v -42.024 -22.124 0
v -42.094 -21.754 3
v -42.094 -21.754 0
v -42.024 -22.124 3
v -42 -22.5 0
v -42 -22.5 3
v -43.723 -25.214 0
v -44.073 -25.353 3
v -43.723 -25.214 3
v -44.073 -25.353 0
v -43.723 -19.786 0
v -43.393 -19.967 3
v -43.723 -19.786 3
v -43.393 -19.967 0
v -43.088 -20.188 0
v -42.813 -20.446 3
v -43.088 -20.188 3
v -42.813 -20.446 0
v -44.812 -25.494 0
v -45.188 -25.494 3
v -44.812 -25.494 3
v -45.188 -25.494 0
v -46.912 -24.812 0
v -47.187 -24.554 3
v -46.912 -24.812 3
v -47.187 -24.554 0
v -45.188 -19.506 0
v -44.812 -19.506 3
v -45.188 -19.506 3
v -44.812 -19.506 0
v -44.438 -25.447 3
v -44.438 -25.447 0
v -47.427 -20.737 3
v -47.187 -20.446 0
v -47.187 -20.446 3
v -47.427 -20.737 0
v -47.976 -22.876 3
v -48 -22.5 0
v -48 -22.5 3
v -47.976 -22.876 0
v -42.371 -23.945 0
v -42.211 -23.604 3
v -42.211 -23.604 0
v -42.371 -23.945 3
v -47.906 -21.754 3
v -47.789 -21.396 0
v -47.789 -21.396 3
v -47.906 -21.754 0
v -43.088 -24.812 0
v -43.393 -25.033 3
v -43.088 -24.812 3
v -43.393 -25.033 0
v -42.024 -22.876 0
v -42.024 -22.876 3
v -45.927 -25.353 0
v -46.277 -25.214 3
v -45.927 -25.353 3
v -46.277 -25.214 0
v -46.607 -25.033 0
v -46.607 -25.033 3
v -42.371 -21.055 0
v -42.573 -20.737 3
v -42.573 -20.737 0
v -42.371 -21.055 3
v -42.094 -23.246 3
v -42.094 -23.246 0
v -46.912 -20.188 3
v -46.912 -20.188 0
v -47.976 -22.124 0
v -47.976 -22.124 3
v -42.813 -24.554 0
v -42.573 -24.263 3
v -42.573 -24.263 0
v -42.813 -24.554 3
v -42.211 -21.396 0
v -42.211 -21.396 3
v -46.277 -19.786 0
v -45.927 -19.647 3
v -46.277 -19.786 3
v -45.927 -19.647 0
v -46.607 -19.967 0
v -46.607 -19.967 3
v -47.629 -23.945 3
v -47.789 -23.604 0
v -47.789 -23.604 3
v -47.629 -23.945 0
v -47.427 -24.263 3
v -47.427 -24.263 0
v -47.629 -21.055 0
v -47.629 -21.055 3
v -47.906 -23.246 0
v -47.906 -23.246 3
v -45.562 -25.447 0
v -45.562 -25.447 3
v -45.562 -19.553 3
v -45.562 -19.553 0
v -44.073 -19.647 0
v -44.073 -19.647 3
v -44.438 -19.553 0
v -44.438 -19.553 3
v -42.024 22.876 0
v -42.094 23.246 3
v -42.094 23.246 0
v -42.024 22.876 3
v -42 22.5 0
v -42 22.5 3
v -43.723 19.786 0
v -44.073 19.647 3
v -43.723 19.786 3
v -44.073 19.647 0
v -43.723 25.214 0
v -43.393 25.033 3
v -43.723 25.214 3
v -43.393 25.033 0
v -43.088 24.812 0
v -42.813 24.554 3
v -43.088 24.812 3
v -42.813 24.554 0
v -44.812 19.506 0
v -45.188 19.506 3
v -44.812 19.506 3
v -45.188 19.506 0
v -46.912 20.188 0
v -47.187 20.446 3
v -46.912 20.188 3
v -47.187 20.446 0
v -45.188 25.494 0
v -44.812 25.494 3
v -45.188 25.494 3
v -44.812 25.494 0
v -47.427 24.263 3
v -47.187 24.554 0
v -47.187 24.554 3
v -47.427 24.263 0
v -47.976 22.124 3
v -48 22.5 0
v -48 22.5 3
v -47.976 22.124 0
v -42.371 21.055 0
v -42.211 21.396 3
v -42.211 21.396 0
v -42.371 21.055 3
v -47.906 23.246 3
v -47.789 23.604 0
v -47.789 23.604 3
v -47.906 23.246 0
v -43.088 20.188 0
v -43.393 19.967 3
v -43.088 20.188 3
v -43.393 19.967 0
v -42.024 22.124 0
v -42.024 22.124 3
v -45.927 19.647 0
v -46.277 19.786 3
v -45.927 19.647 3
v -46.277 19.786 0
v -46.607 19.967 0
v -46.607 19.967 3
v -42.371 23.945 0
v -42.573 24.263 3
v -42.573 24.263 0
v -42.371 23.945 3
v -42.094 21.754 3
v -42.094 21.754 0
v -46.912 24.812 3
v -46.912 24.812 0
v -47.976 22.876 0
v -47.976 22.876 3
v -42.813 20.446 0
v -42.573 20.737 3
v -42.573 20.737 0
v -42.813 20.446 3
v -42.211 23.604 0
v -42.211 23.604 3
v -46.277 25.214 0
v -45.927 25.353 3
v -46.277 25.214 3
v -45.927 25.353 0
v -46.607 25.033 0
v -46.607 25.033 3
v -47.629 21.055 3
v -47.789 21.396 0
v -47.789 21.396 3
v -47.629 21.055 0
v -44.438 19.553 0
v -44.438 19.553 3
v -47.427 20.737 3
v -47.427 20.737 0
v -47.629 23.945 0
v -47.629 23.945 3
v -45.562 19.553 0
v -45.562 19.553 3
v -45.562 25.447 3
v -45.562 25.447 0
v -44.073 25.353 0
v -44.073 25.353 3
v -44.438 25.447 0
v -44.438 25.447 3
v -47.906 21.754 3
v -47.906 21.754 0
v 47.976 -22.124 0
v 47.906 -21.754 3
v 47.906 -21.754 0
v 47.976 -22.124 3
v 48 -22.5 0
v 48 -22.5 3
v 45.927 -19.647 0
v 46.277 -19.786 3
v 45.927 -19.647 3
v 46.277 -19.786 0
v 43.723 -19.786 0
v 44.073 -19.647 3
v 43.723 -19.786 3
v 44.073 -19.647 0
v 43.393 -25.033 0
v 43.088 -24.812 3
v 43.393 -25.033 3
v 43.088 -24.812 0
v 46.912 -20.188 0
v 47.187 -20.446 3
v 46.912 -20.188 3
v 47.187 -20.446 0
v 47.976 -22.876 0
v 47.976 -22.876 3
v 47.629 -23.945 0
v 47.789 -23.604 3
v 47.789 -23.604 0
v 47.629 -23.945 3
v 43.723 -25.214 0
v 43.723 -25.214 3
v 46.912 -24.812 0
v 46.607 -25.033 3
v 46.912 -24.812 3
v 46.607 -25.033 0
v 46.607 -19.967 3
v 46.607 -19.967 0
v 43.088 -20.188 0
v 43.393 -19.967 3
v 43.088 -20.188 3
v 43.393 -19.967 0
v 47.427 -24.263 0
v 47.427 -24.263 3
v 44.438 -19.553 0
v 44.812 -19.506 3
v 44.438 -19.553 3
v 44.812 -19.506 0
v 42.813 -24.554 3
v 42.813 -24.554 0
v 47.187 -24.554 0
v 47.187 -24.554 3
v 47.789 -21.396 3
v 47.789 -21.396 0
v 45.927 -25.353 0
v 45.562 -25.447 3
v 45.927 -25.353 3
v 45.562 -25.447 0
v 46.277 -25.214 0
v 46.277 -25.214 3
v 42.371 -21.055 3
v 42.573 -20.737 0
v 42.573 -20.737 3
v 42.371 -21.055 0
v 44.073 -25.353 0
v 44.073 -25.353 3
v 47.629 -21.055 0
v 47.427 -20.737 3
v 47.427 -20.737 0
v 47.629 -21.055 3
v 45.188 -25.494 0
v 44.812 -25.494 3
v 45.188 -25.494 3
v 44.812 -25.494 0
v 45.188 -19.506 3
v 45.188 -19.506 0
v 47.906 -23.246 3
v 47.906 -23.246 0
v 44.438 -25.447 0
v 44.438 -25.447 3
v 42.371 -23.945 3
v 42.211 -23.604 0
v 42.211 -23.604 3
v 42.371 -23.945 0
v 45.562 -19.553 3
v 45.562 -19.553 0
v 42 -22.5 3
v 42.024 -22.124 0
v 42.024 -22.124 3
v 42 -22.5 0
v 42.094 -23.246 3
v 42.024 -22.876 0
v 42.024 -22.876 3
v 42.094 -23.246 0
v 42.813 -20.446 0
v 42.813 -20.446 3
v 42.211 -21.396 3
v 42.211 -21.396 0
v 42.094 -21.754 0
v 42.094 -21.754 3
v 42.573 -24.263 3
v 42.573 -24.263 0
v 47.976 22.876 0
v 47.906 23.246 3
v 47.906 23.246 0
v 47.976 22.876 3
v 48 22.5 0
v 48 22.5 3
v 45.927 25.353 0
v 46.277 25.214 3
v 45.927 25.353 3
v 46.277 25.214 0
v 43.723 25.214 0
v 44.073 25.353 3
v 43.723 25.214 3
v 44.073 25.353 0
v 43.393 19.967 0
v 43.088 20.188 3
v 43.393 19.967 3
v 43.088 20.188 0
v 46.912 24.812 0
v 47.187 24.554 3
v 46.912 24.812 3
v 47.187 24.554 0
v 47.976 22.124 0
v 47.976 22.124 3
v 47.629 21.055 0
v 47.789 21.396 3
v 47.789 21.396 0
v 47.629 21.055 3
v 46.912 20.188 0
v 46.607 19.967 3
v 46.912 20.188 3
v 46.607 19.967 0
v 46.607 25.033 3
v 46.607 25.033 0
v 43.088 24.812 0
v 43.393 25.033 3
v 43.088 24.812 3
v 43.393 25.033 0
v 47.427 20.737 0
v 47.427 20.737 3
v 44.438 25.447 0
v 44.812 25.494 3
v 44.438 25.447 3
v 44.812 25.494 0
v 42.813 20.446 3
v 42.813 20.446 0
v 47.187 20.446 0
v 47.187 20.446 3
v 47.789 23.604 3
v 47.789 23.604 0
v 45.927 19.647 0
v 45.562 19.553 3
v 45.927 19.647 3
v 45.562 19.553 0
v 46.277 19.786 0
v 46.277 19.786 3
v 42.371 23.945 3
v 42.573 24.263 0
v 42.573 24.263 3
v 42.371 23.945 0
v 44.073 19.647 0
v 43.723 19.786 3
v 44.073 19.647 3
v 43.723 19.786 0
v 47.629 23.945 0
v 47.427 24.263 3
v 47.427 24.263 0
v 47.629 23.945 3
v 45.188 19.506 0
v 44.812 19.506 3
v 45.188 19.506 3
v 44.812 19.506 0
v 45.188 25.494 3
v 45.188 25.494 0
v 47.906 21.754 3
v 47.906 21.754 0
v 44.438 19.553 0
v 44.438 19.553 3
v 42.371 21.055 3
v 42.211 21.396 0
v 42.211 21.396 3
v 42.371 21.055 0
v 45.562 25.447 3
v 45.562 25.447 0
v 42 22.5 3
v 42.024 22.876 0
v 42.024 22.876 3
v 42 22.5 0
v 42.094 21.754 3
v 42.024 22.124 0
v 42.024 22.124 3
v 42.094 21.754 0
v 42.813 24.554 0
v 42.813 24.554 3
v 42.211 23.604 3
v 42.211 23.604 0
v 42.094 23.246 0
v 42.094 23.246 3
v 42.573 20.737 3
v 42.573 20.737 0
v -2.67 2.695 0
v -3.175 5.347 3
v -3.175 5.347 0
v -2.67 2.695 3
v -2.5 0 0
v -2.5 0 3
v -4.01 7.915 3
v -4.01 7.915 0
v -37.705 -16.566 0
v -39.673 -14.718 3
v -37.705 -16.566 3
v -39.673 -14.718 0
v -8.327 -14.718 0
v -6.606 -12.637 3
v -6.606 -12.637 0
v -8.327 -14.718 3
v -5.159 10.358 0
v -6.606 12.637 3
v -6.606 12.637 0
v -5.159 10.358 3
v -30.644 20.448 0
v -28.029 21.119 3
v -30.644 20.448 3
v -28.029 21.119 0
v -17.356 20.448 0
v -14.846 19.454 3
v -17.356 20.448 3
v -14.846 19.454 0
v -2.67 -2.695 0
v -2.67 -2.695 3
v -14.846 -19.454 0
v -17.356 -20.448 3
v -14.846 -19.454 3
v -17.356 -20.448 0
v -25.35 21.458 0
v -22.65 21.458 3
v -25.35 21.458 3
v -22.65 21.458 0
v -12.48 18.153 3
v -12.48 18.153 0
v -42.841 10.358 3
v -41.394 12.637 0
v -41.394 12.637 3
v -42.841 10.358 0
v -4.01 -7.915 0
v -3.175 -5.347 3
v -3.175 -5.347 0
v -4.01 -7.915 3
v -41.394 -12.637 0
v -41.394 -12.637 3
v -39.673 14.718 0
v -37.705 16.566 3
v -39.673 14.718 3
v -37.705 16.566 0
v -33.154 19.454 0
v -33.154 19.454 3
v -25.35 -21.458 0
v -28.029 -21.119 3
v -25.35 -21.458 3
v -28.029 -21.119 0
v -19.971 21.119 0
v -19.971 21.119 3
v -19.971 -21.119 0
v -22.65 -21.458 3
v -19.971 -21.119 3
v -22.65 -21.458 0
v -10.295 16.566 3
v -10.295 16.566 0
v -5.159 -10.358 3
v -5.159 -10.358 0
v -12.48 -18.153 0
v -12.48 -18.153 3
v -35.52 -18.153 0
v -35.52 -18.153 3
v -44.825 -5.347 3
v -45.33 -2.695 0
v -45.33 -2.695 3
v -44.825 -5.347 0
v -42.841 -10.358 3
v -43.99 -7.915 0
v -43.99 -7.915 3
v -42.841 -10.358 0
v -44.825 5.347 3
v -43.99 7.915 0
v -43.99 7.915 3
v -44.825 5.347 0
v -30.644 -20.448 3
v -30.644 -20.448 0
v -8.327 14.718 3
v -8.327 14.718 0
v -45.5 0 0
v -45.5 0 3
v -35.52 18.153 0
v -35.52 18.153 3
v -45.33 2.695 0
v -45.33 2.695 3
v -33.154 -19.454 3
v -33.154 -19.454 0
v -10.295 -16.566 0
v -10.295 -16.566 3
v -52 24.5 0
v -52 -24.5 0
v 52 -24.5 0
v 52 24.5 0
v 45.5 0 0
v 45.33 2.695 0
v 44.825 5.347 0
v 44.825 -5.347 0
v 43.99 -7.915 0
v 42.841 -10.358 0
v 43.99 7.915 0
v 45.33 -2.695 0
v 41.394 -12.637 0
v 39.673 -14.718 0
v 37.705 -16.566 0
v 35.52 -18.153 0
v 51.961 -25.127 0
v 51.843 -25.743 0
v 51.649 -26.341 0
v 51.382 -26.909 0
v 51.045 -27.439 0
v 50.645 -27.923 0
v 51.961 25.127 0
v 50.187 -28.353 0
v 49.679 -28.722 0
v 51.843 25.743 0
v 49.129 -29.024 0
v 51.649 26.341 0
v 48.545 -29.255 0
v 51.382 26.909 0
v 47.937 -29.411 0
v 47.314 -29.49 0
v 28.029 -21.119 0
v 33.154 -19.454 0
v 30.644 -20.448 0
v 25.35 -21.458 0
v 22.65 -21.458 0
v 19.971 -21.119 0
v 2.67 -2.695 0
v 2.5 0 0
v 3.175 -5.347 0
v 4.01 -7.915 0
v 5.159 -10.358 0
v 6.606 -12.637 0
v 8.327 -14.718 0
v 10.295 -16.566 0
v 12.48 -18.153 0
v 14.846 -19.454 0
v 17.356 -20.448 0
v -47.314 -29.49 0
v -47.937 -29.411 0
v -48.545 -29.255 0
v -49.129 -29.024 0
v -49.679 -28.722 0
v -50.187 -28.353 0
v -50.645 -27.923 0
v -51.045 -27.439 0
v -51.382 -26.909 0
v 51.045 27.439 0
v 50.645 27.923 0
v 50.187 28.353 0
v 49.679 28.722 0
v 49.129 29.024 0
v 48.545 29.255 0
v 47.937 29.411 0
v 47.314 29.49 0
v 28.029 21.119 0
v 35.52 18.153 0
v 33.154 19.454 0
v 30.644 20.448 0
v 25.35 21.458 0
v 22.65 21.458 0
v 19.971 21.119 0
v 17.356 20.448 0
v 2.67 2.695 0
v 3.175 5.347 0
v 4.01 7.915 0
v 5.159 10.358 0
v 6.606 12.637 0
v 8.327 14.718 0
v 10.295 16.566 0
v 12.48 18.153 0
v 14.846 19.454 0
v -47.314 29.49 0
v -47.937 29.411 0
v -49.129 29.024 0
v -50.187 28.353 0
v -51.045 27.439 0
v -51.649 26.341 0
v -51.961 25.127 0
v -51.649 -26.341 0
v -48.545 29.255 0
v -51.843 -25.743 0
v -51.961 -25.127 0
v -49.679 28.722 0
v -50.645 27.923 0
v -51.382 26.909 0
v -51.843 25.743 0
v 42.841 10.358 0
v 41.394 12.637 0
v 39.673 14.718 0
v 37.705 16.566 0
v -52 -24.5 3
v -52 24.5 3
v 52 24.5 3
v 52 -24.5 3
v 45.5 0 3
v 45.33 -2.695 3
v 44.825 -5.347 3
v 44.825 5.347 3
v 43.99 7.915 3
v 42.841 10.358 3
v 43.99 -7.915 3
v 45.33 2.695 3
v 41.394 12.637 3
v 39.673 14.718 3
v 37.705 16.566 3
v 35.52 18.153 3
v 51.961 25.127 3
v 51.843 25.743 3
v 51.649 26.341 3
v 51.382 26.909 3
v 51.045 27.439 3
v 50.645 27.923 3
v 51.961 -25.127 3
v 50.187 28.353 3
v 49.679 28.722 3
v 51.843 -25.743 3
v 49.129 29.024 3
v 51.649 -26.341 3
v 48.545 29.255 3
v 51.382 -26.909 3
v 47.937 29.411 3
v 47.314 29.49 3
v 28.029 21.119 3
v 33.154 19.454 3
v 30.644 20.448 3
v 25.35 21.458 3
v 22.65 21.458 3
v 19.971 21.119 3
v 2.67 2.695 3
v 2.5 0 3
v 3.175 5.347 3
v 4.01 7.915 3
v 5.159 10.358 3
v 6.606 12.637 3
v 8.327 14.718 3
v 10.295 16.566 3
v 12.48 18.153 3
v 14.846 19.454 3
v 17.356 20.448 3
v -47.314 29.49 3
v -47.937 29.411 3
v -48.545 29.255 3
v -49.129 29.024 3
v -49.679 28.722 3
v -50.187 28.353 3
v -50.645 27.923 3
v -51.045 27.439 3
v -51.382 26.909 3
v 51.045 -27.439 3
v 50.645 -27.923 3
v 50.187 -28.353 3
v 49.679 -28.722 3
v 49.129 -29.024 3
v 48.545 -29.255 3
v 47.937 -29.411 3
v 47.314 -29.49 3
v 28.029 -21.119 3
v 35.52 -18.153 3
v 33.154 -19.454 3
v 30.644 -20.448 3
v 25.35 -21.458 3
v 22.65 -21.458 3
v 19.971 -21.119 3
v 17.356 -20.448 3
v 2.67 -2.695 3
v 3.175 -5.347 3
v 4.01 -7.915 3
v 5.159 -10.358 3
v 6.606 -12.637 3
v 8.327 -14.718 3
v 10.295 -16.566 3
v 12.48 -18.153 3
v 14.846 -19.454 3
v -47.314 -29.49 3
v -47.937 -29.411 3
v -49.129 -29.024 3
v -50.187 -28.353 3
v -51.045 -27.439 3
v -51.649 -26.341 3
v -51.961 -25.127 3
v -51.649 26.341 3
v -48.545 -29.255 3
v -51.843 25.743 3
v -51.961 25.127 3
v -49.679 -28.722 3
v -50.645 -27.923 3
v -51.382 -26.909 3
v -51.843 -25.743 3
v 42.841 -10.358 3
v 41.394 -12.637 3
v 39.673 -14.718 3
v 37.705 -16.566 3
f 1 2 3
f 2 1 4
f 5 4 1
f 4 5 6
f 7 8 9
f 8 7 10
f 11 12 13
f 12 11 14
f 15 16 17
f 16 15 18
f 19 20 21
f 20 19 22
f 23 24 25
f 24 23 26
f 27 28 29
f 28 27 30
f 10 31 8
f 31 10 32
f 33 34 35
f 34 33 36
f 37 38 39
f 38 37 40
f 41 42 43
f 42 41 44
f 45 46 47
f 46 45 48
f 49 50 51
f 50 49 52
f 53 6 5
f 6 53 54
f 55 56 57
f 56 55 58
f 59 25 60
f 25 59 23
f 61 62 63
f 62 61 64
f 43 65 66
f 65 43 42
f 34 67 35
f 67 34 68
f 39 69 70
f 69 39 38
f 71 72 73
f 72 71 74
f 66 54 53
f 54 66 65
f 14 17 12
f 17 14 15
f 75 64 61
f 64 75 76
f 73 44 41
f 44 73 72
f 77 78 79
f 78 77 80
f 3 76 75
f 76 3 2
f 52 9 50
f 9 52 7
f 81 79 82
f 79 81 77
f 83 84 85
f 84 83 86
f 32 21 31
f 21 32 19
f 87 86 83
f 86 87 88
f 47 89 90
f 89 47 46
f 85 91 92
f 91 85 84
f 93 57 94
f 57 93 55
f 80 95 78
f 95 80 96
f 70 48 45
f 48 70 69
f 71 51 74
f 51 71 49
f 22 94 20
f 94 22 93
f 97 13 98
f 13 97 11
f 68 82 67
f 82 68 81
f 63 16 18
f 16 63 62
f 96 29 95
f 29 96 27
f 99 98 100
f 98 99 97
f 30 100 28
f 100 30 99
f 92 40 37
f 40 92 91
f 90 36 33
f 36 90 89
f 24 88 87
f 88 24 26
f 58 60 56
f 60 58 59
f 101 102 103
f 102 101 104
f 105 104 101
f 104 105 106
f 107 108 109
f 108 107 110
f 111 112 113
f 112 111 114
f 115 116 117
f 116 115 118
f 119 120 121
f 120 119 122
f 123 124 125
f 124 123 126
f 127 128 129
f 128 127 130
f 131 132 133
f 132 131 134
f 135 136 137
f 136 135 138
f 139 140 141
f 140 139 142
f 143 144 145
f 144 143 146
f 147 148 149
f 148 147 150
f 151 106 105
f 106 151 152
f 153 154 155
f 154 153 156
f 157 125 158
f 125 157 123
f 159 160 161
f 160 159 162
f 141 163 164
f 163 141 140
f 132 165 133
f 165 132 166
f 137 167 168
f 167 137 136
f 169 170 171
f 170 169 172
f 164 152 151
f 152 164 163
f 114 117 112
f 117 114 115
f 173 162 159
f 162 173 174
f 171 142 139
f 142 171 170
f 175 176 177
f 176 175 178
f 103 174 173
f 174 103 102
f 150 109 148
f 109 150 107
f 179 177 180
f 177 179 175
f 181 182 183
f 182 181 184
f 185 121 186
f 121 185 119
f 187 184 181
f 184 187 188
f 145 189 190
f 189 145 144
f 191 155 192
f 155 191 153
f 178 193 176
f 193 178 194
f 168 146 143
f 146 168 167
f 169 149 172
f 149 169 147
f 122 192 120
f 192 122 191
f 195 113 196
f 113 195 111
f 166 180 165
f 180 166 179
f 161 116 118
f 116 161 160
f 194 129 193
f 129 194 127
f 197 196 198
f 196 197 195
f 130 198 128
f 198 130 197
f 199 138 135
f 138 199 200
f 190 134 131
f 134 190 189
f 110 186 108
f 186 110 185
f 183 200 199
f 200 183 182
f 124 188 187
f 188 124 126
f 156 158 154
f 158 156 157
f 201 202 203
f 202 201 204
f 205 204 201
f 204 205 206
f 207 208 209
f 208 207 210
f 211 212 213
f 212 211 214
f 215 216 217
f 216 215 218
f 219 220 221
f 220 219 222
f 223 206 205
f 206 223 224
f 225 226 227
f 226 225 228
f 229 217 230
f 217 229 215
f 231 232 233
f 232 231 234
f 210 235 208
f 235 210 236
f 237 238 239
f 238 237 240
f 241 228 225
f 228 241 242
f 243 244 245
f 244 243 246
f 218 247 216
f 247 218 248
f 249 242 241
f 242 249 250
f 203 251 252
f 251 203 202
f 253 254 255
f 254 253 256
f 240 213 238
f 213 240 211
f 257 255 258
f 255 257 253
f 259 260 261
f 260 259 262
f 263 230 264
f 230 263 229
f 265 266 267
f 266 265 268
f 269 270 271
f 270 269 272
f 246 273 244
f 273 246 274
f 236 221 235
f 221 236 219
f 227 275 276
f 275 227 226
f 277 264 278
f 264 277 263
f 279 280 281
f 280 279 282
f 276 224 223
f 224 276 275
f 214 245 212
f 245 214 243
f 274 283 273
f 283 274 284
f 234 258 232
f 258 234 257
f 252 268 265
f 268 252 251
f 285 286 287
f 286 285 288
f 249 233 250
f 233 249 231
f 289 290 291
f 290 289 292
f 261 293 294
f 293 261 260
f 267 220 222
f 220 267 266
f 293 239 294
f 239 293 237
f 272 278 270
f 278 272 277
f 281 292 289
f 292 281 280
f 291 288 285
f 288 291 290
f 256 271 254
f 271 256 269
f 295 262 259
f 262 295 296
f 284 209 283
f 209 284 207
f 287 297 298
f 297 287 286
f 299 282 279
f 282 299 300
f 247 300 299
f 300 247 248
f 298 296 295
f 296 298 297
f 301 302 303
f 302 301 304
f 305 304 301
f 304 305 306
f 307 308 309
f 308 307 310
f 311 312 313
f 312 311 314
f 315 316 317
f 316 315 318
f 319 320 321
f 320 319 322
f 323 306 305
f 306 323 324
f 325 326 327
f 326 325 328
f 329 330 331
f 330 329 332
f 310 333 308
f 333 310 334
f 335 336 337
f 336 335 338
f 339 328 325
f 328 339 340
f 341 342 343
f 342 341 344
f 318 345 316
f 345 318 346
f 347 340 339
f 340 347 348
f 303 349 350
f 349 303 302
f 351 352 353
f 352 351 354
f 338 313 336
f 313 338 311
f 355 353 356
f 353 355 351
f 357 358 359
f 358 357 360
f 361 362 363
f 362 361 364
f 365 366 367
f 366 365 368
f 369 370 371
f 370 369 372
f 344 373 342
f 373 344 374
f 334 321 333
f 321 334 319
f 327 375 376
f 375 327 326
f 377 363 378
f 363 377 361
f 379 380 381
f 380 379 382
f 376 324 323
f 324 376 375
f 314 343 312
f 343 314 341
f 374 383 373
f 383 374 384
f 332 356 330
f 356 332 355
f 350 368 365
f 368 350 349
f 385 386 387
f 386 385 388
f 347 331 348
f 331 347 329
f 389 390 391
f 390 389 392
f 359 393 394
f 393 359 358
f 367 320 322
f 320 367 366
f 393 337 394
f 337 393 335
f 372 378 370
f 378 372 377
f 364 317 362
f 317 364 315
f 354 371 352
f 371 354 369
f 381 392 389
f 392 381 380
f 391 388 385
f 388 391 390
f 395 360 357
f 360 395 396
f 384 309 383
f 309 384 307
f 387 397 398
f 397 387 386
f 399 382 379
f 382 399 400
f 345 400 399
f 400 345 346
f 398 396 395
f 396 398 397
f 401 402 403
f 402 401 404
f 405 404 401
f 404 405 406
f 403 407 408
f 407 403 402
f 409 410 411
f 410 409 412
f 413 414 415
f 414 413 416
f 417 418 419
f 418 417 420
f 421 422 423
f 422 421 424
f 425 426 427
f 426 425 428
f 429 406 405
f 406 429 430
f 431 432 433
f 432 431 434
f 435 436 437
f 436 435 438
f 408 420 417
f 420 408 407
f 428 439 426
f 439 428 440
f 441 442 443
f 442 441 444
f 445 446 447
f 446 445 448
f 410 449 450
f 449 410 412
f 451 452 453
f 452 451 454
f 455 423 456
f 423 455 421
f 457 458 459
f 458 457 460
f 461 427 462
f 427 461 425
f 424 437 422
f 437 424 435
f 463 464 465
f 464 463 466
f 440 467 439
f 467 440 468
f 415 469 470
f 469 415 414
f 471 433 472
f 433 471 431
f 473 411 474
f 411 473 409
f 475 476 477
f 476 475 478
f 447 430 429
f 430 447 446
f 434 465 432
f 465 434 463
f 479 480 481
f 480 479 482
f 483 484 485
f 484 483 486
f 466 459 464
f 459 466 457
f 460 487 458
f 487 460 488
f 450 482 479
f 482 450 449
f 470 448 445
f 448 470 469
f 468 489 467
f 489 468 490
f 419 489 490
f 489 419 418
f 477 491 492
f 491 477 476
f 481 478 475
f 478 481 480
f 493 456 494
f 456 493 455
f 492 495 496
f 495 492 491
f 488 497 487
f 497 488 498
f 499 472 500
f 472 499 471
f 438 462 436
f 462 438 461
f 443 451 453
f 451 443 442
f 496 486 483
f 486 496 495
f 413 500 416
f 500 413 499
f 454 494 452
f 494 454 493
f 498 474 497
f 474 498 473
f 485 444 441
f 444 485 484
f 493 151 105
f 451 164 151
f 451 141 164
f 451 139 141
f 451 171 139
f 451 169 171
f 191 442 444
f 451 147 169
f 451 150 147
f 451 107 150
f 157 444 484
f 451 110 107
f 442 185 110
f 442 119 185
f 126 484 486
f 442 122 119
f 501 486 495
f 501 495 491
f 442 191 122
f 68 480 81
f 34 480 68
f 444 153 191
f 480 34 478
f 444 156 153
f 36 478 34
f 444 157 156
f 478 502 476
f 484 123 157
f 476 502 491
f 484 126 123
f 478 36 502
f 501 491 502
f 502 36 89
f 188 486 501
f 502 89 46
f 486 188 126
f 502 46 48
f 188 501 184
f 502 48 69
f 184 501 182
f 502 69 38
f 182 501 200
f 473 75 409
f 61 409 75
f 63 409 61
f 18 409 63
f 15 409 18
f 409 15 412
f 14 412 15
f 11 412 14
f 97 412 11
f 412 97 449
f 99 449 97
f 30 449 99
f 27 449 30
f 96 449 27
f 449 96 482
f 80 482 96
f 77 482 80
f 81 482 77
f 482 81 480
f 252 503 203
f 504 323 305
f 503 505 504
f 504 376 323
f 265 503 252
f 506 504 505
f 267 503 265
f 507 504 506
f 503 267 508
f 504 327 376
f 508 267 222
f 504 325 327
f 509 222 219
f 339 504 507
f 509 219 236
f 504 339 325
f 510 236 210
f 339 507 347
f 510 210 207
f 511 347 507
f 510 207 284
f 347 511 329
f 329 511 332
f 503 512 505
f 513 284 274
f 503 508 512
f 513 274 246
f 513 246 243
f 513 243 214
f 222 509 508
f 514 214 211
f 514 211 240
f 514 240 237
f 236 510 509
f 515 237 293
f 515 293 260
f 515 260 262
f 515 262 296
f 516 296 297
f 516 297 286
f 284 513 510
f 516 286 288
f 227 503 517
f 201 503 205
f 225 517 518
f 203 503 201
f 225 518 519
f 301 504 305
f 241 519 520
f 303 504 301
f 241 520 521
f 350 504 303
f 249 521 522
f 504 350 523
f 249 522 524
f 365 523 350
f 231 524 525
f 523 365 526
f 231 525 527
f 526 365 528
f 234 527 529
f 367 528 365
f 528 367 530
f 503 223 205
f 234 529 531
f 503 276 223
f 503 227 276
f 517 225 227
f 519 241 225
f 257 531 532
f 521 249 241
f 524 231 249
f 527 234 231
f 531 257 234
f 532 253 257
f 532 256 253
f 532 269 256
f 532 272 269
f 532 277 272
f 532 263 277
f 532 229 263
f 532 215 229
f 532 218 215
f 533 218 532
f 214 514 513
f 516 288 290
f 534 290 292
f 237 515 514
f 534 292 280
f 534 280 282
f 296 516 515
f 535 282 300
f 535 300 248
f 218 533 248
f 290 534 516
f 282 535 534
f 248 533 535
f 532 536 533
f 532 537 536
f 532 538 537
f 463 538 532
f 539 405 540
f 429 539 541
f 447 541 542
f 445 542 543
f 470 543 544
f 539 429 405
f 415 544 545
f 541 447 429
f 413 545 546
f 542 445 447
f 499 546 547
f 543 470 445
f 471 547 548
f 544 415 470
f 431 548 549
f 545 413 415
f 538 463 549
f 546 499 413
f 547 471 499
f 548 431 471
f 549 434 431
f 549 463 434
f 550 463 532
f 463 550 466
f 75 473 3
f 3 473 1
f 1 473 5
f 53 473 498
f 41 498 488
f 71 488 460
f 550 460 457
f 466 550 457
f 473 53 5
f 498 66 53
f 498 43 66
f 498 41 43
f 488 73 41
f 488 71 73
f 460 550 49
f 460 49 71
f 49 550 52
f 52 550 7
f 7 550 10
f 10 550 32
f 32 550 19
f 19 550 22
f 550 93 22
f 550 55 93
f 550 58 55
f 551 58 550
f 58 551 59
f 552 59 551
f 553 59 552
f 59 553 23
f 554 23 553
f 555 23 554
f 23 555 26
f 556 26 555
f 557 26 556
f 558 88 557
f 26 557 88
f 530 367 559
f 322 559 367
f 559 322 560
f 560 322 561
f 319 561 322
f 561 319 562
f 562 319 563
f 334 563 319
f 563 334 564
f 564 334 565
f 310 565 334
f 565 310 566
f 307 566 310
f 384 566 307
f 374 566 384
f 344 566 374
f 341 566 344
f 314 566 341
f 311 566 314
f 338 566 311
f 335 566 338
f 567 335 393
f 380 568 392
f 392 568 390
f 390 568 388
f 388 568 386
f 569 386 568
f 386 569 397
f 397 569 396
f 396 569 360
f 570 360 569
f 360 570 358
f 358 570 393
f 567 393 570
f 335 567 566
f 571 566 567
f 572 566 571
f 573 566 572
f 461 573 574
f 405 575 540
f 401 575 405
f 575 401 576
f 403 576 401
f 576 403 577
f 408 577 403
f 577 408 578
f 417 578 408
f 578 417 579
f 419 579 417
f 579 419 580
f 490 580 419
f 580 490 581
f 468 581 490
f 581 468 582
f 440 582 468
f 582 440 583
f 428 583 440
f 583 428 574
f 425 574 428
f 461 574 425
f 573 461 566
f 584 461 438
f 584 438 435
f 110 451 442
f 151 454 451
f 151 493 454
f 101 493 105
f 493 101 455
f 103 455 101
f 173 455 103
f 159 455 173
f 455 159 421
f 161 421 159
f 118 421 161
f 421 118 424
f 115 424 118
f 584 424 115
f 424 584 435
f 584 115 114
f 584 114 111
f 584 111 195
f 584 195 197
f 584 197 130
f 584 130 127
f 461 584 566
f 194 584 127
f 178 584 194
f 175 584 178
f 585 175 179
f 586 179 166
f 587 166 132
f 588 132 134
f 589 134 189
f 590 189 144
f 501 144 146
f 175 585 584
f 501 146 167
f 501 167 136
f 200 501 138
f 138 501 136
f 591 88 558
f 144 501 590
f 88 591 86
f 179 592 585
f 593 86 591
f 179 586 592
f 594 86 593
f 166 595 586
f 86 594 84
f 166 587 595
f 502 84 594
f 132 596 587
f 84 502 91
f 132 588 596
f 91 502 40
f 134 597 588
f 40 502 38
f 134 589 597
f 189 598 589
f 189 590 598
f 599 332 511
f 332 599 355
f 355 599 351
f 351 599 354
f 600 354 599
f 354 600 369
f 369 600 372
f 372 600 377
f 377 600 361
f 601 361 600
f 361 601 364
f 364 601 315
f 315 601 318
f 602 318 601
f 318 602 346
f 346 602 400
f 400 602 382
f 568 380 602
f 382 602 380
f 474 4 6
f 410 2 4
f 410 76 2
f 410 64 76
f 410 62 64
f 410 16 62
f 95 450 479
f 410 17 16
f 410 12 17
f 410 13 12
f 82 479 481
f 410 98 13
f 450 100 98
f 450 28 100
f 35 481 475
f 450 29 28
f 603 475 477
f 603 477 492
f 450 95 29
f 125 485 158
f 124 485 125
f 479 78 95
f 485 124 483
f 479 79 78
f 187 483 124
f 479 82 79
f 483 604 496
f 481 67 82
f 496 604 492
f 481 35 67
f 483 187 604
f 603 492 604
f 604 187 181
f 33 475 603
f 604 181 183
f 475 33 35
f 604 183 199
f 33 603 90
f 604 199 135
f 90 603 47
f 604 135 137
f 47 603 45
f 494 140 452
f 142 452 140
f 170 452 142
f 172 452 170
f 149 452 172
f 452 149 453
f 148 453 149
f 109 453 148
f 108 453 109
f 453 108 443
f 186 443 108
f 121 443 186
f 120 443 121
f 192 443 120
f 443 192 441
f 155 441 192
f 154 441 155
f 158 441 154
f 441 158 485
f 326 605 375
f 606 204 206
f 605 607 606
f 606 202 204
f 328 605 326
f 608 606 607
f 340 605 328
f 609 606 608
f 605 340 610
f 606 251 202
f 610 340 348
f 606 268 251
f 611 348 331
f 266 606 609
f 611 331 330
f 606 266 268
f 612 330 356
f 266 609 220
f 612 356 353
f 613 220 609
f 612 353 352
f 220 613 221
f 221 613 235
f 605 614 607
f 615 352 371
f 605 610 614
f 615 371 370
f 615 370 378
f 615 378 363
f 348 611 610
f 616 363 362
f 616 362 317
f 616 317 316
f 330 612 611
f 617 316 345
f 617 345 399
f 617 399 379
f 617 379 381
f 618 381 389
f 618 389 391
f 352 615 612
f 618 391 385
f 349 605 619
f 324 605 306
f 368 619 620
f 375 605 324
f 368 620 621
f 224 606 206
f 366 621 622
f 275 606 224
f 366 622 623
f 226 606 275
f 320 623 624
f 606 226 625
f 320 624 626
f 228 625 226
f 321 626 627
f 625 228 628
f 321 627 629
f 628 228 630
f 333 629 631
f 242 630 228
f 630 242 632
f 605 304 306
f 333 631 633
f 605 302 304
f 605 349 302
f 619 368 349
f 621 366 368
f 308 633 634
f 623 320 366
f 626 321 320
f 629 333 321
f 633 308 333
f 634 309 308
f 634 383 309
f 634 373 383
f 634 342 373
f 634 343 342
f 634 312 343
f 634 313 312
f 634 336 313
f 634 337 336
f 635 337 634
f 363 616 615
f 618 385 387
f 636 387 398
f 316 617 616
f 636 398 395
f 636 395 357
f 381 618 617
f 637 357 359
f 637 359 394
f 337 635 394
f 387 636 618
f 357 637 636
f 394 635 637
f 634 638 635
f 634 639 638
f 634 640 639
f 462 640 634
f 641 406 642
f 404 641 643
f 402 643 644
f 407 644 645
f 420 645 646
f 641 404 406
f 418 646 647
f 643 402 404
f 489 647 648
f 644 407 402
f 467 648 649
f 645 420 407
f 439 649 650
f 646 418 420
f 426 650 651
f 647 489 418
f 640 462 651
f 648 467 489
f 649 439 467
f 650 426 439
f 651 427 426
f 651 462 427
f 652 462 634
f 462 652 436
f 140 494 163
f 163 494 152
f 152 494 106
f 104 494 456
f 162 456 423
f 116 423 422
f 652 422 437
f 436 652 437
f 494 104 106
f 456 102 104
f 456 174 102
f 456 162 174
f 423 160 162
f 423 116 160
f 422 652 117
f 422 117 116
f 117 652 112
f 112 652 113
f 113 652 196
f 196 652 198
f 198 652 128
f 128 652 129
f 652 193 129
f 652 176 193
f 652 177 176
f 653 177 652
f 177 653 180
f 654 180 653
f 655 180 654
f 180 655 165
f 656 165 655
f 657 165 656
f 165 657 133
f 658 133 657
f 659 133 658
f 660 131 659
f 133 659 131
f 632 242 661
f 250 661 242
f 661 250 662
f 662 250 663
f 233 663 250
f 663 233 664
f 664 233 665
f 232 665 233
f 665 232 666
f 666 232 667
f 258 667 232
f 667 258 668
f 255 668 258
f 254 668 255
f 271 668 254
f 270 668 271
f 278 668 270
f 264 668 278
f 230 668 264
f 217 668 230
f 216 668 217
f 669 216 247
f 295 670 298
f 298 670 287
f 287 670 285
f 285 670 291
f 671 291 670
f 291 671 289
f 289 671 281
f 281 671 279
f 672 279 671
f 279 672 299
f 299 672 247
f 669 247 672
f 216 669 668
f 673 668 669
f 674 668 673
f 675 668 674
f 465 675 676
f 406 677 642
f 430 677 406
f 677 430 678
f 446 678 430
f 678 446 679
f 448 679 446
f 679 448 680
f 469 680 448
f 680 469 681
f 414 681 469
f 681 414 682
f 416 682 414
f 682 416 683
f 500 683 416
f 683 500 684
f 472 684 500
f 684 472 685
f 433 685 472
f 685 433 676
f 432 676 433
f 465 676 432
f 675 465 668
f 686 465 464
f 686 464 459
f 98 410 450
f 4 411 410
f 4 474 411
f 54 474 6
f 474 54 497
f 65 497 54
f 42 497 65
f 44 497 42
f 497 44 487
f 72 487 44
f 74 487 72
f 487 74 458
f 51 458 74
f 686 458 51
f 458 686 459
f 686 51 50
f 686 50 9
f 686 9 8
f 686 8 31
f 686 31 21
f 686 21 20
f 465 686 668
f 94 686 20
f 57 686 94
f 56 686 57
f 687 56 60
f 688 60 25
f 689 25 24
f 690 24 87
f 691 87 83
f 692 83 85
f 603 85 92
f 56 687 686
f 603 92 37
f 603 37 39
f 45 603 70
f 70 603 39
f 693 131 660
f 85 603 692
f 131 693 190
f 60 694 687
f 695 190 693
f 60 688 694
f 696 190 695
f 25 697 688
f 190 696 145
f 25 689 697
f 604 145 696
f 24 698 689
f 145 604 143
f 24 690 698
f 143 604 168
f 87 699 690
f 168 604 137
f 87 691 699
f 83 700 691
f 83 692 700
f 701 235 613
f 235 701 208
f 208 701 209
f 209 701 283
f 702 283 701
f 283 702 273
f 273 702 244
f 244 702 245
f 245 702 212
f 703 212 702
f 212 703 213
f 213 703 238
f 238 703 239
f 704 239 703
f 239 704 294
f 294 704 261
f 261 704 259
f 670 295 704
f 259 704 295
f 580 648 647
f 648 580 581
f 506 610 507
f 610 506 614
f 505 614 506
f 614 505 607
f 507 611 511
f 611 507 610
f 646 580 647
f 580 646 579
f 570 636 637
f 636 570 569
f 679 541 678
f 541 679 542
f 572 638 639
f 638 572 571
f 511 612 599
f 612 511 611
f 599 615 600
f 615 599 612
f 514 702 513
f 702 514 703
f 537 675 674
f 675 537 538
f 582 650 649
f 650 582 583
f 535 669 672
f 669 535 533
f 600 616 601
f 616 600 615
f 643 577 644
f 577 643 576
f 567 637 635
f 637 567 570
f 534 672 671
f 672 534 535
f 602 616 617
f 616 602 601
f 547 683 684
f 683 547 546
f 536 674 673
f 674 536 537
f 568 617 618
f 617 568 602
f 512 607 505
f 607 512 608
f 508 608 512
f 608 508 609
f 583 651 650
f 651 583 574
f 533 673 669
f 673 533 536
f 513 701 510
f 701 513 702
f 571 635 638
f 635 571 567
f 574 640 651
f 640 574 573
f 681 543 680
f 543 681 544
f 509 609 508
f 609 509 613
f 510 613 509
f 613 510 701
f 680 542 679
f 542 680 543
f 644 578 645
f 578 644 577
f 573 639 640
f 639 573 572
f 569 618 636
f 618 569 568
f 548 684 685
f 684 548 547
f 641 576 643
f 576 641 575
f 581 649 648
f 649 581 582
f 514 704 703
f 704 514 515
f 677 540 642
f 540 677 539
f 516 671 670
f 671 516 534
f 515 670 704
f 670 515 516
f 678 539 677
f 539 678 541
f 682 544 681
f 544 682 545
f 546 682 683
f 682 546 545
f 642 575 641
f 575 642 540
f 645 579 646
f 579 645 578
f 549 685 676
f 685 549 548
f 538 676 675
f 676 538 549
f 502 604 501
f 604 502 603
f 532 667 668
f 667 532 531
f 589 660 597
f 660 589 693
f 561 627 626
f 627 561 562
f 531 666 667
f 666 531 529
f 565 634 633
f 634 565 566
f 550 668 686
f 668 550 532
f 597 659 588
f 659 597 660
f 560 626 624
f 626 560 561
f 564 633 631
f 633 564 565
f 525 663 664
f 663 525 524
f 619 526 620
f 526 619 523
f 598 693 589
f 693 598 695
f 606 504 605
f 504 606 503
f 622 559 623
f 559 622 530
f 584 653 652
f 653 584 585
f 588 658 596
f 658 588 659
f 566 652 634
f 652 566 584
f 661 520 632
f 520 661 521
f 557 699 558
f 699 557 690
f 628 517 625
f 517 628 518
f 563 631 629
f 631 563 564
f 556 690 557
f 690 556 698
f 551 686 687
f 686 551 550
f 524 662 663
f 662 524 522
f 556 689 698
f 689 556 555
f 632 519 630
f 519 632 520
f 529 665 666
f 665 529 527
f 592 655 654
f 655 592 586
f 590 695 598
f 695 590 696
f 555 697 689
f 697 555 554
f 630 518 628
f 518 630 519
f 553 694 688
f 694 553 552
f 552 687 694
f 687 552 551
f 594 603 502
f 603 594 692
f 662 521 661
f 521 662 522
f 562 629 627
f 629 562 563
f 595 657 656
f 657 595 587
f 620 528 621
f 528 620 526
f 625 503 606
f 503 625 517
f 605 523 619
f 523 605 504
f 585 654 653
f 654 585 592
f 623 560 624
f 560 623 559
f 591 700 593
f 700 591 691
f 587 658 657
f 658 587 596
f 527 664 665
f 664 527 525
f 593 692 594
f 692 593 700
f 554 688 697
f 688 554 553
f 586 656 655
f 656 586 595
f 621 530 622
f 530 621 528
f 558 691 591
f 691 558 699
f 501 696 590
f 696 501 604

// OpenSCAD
$fn = 50;


difference() {
	union() {
		hull() {
			translate(v = [-47.0000000000, 24.5000000000, 0]) {
				cylinder(h = 3, r = 5);
			}
			translate(v = [47.0000000000, 24.5000000000, 0]) {
				cylinder(h = 3, r = 5);
			}
			translate(v = [-47.0000000000, -24.5000000000, 0]) {
				cylinder(h = 3, r = 5);
			}
			translate(v = [47.0000000000, -24.5000000000, 0]) {
				cylinder(h = 3, r = 5);
			}
		}
	}
	union() {
		#translate(v = [-45.0000000000, -22.5000000000, -100.0000000000]) {
			cylinder(h = 200, r = 3.0000000000);
		}
		#translate(v = [-45.0000000000, 22.5000000000, -100.0000000000]) {
			cylinder(h = 200, r = 3.0000000000);
		}
		#translate(v = [45.0000000000, -22.5000000000, -100.0000000000]) {
			cylinder(h = 200, r = 3.0000000000);
		}
		#translate(v = [45.0000000000, 22.5000000000, -100.0000000000]) {
			cylinder(h = 200, r = 3.0000000000);
		}
		#translate(v = [-24.0000000000, 0, 0]) {
			cylinder(h = 3, r = 21.5000000000);
		}
		#translate(v = [24.0000000000, 0, 0]) {
			cylinder(h = 3, r = 21.5000000000);
		}
	}
}
